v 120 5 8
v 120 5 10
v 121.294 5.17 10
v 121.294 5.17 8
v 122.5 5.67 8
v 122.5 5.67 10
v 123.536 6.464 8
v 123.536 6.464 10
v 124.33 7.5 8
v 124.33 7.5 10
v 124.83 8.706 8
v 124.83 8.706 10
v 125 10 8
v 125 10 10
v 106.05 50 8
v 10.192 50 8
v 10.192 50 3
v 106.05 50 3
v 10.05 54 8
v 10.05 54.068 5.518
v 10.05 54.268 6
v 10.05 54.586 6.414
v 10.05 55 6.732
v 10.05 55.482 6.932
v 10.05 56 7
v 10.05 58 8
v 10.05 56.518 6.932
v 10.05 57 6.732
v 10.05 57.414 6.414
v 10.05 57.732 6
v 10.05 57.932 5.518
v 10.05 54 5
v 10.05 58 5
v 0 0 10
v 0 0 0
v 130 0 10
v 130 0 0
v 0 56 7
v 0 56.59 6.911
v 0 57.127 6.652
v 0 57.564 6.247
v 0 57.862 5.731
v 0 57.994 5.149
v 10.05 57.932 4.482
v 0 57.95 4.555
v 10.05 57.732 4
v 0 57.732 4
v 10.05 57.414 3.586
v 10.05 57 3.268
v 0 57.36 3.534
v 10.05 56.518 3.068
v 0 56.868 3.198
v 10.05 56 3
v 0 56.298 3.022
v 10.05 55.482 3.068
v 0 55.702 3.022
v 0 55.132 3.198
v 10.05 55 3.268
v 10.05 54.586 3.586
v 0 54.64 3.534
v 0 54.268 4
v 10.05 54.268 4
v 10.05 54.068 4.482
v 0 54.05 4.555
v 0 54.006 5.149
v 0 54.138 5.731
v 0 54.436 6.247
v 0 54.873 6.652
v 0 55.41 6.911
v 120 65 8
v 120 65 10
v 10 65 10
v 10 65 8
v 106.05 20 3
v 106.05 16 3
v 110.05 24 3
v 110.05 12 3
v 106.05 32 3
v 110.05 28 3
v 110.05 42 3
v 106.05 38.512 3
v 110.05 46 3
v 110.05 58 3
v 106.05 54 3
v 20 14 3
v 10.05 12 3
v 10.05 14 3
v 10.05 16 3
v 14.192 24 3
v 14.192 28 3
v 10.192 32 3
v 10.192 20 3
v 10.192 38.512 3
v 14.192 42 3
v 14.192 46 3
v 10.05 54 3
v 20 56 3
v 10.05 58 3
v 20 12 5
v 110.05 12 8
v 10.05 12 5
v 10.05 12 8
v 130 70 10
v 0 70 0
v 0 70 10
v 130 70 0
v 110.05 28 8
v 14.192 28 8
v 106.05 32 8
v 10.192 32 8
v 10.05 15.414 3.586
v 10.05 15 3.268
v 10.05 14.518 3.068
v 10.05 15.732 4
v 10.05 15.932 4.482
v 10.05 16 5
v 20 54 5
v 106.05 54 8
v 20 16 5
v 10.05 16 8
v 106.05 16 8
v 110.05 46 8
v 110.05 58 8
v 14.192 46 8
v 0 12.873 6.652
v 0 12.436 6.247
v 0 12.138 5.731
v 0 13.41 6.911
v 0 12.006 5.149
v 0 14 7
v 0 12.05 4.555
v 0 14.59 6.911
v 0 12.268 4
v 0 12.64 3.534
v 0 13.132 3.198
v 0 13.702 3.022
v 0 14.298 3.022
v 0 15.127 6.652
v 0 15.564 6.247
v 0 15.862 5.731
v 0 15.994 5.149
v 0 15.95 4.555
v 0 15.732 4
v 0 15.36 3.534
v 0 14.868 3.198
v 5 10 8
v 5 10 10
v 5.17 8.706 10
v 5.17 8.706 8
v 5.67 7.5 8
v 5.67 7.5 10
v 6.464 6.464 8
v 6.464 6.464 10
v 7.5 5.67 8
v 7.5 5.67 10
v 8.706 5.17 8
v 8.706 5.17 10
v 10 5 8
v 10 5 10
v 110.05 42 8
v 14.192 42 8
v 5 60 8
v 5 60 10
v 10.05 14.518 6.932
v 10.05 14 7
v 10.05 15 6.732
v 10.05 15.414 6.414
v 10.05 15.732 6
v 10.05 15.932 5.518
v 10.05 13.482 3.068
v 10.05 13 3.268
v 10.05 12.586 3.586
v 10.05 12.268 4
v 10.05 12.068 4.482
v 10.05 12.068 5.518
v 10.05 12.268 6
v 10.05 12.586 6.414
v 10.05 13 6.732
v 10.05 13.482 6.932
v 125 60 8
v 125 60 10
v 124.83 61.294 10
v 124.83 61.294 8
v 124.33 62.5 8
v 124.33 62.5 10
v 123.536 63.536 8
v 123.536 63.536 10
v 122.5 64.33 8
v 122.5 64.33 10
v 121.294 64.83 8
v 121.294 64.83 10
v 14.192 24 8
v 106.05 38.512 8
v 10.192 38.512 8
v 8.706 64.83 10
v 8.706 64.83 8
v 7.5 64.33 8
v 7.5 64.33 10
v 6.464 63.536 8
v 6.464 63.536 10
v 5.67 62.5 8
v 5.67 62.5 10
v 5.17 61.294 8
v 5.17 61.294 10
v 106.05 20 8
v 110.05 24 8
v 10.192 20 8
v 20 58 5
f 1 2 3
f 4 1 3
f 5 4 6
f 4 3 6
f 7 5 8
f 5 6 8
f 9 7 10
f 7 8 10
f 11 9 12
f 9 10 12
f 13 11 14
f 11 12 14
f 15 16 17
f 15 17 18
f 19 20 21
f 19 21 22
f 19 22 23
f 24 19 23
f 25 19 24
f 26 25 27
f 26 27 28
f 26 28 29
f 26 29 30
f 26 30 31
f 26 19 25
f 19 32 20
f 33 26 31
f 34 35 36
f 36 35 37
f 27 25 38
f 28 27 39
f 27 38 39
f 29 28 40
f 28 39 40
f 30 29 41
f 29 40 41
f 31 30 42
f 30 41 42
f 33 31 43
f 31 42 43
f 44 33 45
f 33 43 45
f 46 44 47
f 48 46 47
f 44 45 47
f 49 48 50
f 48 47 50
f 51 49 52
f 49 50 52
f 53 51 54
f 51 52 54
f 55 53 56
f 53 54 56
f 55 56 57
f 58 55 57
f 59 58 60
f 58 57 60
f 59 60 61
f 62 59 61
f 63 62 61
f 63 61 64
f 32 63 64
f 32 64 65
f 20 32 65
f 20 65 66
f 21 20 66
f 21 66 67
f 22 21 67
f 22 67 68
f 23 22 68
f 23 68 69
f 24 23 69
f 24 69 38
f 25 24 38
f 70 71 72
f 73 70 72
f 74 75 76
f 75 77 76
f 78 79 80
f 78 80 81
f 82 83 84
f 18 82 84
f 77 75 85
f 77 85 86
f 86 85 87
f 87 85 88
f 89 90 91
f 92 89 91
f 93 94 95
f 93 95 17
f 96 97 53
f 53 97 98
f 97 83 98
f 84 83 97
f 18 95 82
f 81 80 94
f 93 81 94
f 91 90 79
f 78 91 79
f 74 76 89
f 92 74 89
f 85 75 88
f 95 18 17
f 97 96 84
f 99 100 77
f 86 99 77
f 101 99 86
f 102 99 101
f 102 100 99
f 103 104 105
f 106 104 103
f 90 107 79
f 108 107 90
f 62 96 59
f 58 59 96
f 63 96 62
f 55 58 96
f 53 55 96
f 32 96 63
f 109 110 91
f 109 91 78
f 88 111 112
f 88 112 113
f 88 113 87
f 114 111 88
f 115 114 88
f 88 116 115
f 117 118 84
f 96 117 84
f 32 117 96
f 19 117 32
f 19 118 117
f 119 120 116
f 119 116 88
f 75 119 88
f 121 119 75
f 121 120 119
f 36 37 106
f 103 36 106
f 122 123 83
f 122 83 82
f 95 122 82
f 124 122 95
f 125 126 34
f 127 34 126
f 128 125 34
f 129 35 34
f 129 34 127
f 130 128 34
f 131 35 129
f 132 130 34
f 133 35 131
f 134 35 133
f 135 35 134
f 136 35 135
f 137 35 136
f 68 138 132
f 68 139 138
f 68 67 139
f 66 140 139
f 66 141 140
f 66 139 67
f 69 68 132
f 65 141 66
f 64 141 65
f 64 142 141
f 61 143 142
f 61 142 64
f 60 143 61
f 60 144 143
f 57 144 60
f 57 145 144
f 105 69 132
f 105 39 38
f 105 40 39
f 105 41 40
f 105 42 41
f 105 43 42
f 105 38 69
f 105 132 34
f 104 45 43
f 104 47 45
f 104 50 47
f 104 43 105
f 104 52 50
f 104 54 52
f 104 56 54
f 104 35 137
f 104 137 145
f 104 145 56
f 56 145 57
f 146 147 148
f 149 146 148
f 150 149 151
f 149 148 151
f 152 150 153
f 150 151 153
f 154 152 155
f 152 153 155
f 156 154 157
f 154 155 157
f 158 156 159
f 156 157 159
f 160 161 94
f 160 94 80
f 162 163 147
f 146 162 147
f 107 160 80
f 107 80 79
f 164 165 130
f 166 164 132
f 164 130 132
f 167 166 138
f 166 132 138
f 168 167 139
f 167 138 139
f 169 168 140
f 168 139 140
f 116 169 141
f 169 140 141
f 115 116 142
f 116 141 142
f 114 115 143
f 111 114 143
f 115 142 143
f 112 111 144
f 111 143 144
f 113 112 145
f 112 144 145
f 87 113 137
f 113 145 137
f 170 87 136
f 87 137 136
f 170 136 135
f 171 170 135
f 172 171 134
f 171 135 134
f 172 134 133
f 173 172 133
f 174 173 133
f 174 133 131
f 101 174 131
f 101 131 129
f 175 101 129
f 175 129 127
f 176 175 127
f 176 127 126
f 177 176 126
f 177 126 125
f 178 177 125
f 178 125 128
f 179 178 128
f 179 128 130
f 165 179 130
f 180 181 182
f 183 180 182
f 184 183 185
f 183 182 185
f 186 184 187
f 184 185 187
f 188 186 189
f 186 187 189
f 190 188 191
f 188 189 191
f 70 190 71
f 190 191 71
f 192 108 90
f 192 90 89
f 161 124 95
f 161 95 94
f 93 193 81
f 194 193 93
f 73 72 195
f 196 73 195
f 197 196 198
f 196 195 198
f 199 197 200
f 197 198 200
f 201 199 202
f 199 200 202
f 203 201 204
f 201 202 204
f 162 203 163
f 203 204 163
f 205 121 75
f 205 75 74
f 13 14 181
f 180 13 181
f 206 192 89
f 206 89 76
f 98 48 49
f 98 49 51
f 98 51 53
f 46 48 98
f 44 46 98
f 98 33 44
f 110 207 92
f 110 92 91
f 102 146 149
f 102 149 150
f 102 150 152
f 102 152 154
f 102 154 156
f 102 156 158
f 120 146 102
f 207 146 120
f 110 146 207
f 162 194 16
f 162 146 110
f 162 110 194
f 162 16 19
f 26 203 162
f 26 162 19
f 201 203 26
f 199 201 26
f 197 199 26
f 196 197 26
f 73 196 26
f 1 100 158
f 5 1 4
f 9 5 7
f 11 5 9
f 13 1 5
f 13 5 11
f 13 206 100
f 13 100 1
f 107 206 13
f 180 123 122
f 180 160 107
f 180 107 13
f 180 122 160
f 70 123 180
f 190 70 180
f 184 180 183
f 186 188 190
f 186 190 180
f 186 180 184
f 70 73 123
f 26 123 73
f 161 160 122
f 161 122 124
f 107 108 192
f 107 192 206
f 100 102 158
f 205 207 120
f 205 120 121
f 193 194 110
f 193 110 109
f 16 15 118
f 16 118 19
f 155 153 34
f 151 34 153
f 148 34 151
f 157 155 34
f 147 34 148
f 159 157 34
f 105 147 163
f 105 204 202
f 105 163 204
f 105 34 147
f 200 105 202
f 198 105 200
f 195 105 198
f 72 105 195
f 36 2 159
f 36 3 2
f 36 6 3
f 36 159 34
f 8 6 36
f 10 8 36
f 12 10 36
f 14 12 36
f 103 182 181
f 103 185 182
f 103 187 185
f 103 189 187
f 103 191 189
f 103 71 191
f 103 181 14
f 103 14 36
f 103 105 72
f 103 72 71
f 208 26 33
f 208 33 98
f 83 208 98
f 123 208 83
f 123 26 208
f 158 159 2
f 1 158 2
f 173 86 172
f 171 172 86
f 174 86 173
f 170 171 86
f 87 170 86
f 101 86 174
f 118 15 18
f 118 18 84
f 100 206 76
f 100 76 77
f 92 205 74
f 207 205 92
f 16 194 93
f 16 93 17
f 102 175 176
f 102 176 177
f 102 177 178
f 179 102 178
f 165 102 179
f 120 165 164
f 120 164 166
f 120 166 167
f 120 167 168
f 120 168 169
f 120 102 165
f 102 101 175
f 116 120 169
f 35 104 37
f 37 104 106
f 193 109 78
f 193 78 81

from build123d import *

# Parameters (mm, degrees)
ESQUISSE1_W             = 130
ESQUISSE1_H             = 70
BOSS_EXTRU_1_DEPTH      = 10
ENL_V_MAT_EXTRU_1_DEPTH = 2
ESQUISSE19_R            = 2
ENL_V_MAT_EXTRU_2_DEPTH = 20
ENL_V_MAT_EXTRU_3_DEPTH = 5


with BuildPart() as part:
    # Esquisse1 → Boss.-Extru.1 (new body)
    with BuildSketch(Plane.XY):
        with Locations((65, 35)):
            Rectangle(ESQUISSE1_W, ESQUISSE1_H)
    extrude(amount=BOSS_EXTRU_1_DEPTH)

    # Esquisse18 → Enlèv. mat.-Extru.1 (cut)
    with BuildSketch(Plane.XY.offset(10)):
        with BuildLine():
            Line((10, 5), (120, 5))
            ThreePointArc((120, 5), (123.535533906, 6.464466094), (125, 10))
            Line((125, 10), (125, 60))
            ThreePointArc((125, 60), (123.535533906, 63.535533906), (120, 65))
            Line((120, 65), (10, 65))
            ThreePointArc((10, 65), (6.464466094, 63.535533906), (5, 60))
            Line((5, 60), (5, 10))
            ThreePointArc((5, 10), (6.464466094, 6.464466094), (10, 5))
        make_face()
    extrude(amount=-ENL_V_MAT_EXTRU_1_DEPTH, mode=Mode.SUBTRACT)

    # Esquisse19 → Enlèv. mat.-Extru.2 (cut)
    with BuildSketch(Plane.ZY):
        with Locations((5, 56)):
            Circle(ESQUISSE19_R)
        with Locations((5, 14)):
            Circle(ESQUISSE19_R)
    extrude(amount=-ENL_V_MAT_EXTRU_2_DEPTH, mode=Mode.SUBTRACT)

    # Esquisse20 → Enlèv. mat.-Extru.3 (cut)
    with BuildSketch(Plane.XY.offset(8)):
        Polygon((10.050143374, 58), (110.050143374, 58), (110.050143374, 46), (14.191824128, 46), (14.191824128, 42), (110.050143374, 42), (110.050143374, 28), (14.191824128, 28), (14.191824128, 24), (110.050143374, 24), (110.050143374, 12), (10.050143374, 12), (10.050143374, 16), (106.050143374, 16), (106.050143374, 20), (10.191824128, 20), (10.191824128, 32), (106.050143374, 32), (106.050143374, 38.512028665), (10.191824128, 38.512028665), (10.191824128, 50), (106.050143374, 50), (106.050143374, 54), (10.050143374, 54), align=None)
    extrude(amount=-ENL_V_MAT_EXTRU_3_DEPTH, mode=Mode.SUBTRACT)


solid = part.part
